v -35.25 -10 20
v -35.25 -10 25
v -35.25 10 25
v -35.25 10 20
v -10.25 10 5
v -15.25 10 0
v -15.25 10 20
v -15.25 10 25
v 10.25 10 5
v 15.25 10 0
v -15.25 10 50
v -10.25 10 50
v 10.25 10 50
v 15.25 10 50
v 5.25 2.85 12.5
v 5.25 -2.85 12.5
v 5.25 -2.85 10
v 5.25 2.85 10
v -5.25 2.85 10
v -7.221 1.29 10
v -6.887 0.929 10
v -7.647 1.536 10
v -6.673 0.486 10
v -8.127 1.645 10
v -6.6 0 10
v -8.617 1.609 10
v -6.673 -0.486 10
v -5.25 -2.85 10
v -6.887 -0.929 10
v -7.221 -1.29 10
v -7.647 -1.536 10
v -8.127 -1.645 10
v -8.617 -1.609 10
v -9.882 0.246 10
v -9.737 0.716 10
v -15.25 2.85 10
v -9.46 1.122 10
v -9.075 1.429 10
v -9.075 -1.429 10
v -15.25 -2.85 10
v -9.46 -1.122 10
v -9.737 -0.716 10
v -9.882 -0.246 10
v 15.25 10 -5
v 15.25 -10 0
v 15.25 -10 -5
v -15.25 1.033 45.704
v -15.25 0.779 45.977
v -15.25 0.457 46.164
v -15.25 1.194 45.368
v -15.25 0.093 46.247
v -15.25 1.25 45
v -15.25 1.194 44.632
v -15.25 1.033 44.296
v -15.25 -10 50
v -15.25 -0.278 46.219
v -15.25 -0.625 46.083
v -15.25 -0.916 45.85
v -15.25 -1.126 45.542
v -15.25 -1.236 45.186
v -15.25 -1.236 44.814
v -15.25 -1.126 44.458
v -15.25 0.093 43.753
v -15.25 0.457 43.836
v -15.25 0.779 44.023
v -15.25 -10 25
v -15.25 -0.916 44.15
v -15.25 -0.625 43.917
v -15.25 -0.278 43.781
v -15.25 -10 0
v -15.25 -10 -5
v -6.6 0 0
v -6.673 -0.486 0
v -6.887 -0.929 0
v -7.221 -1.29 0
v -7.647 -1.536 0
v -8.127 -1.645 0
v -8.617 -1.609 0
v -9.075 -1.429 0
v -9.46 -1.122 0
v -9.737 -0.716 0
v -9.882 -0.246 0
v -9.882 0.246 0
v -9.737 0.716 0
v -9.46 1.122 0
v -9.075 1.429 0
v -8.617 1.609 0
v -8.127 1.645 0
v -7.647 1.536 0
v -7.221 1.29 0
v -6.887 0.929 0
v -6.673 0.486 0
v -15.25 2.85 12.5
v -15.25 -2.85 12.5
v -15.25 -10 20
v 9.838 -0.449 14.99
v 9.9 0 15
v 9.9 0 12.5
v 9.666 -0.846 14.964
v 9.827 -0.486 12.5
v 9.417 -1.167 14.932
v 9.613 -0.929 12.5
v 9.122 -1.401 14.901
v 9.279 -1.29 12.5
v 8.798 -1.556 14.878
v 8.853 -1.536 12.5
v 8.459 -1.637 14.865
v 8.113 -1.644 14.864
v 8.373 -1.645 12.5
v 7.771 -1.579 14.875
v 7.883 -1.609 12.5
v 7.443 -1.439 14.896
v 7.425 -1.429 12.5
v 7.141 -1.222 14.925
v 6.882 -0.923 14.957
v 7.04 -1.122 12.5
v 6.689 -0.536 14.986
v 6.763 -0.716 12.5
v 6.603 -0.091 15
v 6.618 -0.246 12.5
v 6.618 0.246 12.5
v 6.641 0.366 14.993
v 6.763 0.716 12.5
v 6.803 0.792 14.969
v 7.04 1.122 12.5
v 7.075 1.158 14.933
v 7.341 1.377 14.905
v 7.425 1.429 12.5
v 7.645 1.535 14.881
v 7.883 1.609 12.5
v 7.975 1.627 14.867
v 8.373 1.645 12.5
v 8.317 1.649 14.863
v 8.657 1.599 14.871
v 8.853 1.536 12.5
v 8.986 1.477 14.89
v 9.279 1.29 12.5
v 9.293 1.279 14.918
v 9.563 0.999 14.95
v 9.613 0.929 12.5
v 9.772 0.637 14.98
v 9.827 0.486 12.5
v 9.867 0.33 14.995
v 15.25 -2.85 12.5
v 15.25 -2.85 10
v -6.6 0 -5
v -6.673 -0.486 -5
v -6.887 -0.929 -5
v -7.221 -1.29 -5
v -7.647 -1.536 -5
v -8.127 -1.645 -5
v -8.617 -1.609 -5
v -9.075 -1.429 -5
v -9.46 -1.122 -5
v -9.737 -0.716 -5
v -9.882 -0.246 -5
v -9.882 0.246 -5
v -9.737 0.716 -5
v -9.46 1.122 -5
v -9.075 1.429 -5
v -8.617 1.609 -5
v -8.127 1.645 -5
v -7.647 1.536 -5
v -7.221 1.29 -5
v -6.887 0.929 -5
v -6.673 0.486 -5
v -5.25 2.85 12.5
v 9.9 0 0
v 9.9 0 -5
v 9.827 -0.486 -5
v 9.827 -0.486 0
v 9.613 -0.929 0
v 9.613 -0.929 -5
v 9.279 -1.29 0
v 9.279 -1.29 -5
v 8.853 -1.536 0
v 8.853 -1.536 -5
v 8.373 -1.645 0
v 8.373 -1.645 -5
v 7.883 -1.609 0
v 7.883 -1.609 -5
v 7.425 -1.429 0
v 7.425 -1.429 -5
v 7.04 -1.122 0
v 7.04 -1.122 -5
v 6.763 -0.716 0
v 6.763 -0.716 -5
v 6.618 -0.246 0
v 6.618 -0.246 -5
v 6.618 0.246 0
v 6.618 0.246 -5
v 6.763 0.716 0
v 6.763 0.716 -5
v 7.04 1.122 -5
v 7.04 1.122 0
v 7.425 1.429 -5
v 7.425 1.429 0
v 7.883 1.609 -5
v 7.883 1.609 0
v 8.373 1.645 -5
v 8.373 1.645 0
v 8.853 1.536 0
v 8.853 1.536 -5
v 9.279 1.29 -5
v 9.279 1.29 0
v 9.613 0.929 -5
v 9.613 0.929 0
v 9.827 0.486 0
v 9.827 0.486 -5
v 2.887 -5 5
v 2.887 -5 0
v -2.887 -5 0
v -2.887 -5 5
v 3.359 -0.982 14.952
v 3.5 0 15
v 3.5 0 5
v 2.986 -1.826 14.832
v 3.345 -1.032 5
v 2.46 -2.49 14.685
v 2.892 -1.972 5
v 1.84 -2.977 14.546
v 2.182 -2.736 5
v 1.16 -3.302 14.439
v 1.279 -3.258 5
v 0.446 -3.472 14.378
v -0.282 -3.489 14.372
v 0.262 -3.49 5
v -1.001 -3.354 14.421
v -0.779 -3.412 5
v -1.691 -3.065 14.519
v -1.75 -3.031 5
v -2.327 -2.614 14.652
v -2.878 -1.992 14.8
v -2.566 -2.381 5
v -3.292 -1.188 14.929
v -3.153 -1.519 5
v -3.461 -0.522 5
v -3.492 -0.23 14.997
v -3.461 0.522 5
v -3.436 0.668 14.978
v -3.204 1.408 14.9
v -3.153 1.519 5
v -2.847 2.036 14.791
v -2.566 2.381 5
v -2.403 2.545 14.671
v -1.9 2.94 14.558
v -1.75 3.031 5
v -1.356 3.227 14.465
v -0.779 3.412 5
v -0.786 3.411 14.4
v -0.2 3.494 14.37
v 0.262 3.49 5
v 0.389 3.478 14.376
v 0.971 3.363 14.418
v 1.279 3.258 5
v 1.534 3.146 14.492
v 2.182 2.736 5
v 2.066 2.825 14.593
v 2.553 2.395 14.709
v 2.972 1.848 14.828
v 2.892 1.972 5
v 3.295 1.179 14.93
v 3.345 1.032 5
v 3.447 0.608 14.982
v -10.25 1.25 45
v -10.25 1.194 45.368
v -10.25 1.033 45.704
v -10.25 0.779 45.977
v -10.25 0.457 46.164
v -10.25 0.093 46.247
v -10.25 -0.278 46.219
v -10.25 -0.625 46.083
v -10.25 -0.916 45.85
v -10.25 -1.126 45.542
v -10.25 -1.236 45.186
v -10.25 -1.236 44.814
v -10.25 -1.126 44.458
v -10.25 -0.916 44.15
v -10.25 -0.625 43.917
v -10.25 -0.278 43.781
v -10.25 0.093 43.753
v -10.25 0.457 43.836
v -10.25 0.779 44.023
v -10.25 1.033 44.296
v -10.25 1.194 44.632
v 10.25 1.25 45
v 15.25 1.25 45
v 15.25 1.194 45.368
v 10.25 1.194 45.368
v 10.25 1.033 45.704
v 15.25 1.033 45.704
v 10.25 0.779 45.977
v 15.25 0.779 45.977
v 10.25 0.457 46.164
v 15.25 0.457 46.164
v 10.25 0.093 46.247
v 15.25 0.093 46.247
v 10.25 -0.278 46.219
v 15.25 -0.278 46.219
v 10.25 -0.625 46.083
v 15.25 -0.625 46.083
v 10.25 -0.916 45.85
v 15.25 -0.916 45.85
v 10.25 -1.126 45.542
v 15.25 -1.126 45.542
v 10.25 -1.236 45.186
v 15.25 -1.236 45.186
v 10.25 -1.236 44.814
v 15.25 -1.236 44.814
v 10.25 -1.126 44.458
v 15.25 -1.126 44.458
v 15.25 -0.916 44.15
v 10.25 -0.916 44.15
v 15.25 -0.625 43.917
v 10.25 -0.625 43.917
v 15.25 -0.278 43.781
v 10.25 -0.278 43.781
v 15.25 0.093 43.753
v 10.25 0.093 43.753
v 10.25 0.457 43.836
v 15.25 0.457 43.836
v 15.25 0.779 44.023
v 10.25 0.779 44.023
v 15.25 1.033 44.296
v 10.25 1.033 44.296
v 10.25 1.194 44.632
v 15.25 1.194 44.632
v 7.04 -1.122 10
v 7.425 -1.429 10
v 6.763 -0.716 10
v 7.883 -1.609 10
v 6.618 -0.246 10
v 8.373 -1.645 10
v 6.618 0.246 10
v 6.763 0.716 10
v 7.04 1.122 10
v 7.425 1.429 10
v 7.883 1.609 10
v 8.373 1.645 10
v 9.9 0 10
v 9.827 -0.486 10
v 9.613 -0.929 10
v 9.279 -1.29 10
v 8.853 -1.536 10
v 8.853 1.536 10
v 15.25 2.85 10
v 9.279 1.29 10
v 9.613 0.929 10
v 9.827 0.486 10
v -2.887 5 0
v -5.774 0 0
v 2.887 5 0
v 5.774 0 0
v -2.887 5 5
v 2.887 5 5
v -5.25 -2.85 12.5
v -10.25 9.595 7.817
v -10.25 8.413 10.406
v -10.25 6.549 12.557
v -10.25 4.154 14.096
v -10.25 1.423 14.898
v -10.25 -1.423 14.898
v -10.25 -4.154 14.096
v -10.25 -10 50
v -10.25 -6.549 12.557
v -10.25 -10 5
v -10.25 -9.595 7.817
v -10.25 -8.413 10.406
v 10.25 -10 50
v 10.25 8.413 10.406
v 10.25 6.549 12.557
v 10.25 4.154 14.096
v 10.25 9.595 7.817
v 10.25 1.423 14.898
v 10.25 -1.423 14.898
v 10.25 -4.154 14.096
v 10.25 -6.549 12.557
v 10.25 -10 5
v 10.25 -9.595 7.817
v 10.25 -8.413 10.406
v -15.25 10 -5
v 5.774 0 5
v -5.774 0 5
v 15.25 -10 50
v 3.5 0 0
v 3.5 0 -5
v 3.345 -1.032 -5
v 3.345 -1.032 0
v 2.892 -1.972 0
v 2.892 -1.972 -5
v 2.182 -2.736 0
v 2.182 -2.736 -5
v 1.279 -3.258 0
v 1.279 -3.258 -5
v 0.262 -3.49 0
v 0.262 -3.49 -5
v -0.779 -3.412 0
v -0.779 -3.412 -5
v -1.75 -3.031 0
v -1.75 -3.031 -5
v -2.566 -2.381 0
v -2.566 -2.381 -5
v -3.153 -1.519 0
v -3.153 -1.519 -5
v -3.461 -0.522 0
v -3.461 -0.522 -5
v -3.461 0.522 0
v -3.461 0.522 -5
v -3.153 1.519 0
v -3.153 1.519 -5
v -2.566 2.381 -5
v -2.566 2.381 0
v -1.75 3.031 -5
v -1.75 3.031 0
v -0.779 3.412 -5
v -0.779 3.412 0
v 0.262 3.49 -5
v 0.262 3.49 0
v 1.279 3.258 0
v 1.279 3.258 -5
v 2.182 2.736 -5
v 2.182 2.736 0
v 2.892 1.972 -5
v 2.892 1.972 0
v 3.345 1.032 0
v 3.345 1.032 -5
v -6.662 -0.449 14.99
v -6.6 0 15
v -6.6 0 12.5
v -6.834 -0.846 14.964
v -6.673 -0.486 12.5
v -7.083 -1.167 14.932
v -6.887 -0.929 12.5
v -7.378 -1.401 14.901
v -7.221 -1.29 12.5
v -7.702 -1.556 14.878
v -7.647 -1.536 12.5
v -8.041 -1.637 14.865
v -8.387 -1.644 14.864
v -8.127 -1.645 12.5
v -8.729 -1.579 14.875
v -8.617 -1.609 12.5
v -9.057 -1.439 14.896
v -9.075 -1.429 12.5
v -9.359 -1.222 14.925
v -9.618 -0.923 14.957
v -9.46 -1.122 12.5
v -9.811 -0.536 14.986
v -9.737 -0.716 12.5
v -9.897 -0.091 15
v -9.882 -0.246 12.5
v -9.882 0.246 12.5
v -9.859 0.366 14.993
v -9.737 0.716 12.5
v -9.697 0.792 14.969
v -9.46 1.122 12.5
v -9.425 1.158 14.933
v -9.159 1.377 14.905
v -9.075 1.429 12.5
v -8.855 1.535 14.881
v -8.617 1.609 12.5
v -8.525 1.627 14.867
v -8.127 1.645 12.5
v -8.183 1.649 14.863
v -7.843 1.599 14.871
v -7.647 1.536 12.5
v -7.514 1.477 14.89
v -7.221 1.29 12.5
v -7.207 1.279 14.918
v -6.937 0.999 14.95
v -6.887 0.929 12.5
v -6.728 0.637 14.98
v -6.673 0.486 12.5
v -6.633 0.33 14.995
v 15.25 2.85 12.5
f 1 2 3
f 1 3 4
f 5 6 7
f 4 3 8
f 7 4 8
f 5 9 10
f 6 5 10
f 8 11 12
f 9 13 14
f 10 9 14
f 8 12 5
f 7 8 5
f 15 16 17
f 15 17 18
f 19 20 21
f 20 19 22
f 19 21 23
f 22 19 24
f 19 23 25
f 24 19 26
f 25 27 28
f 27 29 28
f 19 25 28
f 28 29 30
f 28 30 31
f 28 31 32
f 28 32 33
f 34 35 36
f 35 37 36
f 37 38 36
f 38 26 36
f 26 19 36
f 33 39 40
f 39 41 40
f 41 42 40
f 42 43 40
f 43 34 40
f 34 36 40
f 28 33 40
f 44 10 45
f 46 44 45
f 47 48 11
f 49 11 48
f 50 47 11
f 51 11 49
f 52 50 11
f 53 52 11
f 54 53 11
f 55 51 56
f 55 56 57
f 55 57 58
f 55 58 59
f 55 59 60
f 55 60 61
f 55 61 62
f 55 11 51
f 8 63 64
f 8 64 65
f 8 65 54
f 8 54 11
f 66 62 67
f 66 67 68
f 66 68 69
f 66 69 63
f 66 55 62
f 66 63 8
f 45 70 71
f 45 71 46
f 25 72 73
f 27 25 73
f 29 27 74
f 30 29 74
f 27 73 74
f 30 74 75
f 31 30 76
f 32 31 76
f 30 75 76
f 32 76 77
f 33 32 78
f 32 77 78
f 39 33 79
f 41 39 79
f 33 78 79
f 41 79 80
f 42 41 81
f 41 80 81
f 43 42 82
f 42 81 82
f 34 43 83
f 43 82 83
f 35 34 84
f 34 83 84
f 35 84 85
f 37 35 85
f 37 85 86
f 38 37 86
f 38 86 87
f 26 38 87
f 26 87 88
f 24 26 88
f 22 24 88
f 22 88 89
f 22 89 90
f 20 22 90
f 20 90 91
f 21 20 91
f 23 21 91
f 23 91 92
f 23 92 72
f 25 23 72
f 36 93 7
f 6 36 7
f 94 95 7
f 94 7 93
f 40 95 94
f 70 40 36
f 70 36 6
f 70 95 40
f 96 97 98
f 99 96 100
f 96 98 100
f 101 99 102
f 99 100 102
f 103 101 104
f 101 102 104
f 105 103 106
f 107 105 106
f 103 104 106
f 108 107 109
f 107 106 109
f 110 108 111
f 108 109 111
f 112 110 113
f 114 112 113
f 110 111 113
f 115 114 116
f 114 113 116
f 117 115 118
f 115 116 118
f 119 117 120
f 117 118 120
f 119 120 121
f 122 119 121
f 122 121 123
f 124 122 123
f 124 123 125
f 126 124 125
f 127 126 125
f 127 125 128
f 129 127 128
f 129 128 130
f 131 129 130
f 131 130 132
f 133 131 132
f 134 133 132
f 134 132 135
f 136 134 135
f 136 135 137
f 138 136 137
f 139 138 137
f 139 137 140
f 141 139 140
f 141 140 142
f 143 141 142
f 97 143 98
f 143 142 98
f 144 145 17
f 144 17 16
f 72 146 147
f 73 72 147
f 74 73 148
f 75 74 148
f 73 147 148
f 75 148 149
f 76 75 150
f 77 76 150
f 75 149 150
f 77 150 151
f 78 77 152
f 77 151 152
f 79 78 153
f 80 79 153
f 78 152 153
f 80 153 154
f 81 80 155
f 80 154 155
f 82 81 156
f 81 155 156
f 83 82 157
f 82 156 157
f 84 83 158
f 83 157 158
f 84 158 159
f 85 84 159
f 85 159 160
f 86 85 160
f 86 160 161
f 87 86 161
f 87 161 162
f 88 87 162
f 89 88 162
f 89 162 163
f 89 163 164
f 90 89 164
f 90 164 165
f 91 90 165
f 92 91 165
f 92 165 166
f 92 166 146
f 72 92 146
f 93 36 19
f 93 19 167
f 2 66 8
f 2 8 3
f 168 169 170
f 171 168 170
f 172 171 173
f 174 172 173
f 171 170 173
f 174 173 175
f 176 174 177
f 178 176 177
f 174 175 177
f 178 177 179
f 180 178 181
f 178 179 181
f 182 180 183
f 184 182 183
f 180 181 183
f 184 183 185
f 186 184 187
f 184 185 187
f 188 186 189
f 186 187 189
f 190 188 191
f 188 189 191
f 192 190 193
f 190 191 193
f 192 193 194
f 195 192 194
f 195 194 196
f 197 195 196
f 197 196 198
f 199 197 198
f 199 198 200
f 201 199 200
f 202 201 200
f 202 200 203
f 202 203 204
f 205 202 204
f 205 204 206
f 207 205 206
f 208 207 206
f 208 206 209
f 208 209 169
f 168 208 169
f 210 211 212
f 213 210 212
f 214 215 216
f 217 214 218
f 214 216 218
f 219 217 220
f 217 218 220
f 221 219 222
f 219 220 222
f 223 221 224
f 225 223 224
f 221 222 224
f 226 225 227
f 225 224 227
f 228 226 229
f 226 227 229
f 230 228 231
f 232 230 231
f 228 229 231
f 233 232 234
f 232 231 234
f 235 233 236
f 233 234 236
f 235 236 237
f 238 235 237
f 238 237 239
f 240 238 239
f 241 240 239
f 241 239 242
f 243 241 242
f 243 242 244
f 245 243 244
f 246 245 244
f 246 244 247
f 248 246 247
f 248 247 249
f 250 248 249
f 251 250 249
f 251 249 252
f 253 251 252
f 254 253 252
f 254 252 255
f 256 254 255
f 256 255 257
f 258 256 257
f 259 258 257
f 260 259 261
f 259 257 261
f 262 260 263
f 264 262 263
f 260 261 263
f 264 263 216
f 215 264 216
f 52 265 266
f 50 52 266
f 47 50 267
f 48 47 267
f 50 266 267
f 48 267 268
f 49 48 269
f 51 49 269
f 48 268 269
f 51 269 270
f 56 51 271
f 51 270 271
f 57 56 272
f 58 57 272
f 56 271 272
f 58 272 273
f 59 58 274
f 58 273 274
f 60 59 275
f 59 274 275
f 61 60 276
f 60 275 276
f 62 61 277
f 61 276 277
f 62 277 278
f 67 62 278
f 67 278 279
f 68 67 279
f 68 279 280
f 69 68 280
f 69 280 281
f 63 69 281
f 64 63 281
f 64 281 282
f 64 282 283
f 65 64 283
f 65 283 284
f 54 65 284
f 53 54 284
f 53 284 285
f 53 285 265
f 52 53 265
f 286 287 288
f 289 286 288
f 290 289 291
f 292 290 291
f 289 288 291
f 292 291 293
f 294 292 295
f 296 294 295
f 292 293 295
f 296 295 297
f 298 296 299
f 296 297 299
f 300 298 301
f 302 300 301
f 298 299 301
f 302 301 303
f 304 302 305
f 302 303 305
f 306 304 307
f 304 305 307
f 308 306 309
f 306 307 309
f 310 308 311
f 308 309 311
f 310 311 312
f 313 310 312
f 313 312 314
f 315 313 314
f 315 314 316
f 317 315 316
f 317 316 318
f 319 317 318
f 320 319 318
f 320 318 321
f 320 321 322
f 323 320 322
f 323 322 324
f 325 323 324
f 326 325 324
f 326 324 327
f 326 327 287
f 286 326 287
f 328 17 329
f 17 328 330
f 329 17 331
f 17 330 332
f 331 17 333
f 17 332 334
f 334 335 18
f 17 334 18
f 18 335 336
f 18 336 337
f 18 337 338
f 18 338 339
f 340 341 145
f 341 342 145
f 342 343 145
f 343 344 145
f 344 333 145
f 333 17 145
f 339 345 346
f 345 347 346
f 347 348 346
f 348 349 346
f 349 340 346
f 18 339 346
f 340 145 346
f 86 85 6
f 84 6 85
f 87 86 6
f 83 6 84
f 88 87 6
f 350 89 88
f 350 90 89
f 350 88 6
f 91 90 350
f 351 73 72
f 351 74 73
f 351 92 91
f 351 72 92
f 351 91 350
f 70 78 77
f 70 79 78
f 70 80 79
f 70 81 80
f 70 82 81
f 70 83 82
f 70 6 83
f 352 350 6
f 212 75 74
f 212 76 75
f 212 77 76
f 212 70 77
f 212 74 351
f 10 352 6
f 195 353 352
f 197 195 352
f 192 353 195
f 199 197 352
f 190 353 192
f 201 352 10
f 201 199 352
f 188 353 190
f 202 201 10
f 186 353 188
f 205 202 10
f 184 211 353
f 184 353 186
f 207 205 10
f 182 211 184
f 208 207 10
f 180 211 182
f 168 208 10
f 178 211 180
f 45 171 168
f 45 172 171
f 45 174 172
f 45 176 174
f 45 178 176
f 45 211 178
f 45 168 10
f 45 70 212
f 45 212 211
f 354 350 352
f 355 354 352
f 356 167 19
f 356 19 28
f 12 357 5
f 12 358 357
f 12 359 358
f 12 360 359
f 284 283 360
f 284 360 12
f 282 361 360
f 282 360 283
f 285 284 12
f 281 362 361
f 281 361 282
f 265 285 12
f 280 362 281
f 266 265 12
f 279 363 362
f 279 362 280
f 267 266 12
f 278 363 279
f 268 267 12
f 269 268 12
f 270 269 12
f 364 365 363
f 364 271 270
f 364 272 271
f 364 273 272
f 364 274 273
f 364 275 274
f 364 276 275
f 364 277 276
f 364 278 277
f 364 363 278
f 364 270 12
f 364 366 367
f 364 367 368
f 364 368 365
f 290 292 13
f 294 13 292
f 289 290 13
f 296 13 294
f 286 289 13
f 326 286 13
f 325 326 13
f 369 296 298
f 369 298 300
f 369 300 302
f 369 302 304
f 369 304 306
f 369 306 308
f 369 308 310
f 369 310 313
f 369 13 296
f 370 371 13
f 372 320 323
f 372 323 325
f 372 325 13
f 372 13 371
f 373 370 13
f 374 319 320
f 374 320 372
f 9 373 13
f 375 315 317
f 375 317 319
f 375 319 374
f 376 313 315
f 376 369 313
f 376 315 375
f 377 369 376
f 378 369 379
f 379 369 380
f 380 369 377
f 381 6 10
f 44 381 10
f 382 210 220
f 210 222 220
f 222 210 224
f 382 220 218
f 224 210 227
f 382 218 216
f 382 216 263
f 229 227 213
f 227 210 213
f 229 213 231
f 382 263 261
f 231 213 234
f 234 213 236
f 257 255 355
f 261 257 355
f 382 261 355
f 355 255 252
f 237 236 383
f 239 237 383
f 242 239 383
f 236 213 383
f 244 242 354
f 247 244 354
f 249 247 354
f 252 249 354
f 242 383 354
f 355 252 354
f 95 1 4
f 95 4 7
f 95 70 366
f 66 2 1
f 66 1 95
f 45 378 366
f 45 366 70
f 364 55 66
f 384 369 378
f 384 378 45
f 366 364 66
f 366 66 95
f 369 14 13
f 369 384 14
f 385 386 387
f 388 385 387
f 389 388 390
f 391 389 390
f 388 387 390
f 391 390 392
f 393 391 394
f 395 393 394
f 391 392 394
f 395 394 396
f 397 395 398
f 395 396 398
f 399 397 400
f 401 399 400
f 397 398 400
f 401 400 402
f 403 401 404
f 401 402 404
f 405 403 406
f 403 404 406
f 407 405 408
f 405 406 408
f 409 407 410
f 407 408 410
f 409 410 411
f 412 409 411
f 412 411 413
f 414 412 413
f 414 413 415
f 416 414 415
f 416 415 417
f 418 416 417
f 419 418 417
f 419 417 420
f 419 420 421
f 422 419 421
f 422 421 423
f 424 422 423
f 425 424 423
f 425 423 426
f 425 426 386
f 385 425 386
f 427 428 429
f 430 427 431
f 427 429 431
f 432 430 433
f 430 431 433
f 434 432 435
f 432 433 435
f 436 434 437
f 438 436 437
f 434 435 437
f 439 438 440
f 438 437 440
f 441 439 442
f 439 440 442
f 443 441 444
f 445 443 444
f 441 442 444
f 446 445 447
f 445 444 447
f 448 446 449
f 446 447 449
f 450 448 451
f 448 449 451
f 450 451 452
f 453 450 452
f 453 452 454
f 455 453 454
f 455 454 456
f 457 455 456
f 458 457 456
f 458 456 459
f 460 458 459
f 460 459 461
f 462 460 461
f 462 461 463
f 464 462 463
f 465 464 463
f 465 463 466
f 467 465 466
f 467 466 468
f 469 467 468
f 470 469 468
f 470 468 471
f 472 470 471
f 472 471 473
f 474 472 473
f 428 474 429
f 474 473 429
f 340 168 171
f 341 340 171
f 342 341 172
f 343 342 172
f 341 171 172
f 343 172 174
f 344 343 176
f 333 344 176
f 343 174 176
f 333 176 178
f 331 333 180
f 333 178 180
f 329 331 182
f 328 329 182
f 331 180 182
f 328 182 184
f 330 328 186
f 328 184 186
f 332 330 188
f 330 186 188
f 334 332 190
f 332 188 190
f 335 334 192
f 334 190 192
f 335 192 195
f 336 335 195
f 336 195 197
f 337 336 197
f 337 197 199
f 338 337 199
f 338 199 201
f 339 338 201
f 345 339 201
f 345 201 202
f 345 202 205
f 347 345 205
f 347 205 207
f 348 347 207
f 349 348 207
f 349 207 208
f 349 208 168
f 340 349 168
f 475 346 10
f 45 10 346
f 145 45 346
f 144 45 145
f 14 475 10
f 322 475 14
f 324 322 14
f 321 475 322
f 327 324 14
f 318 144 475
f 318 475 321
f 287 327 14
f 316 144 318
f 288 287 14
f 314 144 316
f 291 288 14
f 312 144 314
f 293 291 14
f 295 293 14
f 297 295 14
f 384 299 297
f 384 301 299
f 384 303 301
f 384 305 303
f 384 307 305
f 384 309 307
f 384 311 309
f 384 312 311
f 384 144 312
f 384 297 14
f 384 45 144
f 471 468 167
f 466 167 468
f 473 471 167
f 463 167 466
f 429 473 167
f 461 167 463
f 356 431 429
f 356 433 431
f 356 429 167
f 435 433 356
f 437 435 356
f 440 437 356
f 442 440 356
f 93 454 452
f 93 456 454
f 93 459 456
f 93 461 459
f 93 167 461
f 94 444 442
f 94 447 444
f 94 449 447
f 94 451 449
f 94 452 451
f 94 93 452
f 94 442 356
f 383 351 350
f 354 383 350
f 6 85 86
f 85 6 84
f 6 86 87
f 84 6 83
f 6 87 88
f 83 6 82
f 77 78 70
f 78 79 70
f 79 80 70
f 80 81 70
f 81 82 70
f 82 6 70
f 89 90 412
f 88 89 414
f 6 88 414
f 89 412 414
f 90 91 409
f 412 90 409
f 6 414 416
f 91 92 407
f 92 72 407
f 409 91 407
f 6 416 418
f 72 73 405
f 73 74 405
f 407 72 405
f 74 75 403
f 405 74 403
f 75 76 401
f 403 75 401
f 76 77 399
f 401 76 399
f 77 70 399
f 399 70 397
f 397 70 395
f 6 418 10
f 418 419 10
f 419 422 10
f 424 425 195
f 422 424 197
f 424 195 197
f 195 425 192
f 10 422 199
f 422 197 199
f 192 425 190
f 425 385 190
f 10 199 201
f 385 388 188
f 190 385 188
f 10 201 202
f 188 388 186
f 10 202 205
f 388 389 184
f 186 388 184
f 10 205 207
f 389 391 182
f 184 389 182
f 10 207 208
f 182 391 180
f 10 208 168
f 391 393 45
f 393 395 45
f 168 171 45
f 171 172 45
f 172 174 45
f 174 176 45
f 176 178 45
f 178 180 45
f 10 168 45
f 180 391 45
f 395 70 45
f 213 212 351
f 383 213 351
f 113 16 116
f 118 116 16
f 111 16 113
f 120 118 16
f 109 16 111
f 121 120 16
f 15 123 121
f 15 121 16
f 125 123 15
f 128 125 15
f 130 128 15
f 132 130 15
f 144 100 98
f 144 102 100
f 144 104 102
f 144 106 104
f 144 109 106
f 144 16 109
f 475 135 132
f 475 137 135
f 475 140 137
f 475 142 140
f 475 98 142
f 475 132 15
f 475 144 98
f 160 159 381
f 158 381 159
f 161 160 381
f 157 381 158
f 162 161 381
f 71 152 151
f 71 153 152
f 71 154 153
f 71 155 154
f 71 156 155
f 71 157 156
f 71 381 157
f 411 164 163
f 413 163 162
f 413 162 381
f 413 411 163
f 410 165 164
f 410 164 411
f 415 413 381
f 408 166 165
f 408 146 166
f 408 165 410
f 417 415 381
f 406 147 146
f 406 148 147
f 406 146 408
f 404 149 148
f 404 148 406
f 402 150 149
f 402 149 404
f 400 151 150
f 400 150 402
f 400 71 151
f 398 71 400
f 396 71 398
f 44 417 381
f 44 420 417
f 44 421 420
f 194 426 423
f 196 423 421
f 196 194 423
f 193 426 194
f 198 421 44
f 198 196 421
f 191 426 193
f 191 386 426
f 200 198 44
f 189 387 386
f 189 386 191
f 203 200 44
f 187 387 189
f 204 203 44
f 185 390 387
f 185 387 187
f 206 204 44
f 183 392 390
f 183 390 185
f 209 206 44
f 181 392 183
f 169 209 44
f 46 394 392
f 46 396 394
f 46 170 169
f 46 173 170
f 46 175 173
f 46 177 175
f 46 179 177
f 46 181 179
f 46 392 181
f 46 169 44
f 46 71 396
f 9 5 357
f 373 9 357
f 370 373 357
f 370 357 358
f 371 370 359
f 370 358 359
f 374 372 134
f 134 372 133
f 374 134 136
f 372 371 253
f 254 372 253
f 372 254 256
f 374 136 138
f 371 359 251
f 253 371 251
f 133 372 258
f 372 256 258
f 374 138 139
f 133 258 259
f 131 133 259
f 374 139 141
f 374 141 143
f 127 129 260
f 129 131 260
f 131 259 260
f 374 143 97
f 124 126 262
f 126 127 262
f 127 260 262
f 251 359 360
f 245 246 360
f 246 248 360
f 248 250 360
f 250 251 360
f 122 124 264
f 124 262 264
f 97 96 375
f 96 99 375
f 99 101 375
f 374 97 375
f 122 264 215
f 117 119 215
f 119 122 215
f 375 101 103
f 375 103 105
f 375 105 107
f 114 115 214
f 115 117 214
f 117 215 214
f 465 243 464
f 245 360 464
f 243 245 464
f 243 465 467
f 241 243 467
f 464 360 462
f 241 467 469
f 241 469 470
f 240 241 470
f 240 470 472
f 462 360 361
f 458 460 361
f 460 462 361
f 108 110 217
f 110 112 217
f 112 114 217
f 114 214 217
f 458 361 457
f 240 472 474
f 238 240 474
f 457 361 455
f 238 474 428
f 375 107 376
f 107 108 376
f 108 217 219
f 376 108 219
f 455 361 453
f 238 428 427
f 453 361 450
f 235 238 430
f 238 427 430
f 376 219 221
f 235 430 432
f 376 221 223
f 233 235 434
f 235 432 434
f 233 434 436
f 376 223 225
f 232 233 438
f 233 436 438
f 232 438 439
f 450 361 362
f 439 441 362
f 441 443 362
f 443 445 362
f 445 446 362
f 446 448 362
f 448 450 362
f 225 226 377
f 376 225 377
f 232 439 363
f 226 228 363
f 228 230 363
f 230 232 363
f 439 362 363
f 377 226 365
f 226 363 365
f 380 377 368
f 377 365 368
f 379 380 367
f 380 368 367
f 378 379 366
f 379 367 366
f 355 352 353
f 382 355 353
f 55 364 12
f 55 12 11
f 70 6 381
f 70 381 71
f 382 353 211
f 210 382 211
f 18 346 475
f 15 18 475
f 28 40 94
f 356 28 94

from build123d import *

# Parameters (mm, degrees)
F1_DEPTH  = 10
F3_W      = 30.5
F3_H      = 20
F4_DEPTH  = 5
F5_DEPTH  = 5
F10_DEPTH = 20.5
F6_R      = 3.5
F6_R_2    = 1.65
F11_DEPTH = 55.001
F12_R     = 1.25
F13_DEPTH = 50.501
F7_W      = 5.7
F7_H      = 2.5
F14_DEPTH = 10
F8_W      = 5.7
F8_H      = 2.5
F15_DEPTH = 10


with BuildPart() as f1:
    # F0 (on Front) → F1 (new body, symmetric)
    with BuildSketch(Plane.XZ):
        Polygon((10.25, 5), (0, 5), (-10.25, 5), (-10.25, 50), (-15.25, 50), (-15.25, 25), (-35.25, 25), (-35.25, 20), (-15.25, 20), (-15.25, 0), (0, 0), (15.25, 0), (15.25, 50), (10.25, 50), align=None)
    extrude(amount=F1_DEPTH, both=True)

    # F2 (on face) → F5 (cut)
    with BuildSketch(Plane(origin=(0, 0, 0), x_dir=(1, 0, 0), z_dir=(0, 0, -1))):
        Polygon((2.8867513459, 5), (-2.8867513459, 5), (-5.7735026919, 0), (-2.8867513459, -5), (2.8867513459, -5), (5.7735026919, 0), align=None)
    extrude(amount=-F5_DEPTH, mode=Mode.SUBTRACT)

    # F9 (on face) → F10 (join, through all)
    with BuildSketch(Plane.YZ.offset(-10.25)):
        with BuildLine():
            Line((-10, 5), (10, 5))
            ThreePointArc((10, 5), (0, 15), (-10, 5))
        make_face()
    extrude(amount=F10_DEPTH)


with BuildPart() as f4:
    # F3 (on face) → F4 (new body)
    with BuildSketch(Plane(origin=(0, 0, 0), x_dir=(1, 0, 0), z_dir=(0, 0, -1))):
        Rectangle(F3_W, F3_H)
    extrude(amount=F4_DEPTH)


with BuildPart() as f11_tool:
    # F6 (on face) → F11 (new body, through all)
    with BuildSketch(Plane(origin=(0, 0, -5), x_dir=(1, 0, 0), z_dir=(0, 0, -1))):
        Circle(F6_R)
        with Locations((-8.25, 0)):
            Circle(F6_R_2)
        with Locations((8.25, 0)):
            Circle(F6_R_2)
    extrude(amount=-F11_DEPTH)


with BuildPart() as f1_1:
    add(f1.part)

    # F11: cut by f11_tool
    add(f11_tool.part, mode=Mode.SUBTRACT)

    # F12 (on face) → F13 (cut, through all)
    with BuildSketch(Plane.YZ.offset(15.25)):
        with Locations((0, 45)):
            Circle(F12_R)
    extrude(amount=-F13_DEPTH, mode=Mode.SUBTRACT)

    # F7 (on face) → F14 (cut)
    with BuildSketch(Plane(origin=(-15.25, 0, 0), x_dir=(0, -1, 0), z_dir=(-1, 0, 0))):
        with Locations((0, 11.25)):
            Rectangle(F7_W, F7_H)
    extrude(amount=-F14_DEPTH, mode=Mode.SUBTRACT)

    # F8 (on face) → F15 (cut)
    with BuildSketch(Plane.YZ.offset(15.25)):
        with Locations((0, 11.25)):
            Rectangle(F8_W, F8_H)
    extrude(amount=-F15_DEPTH, mode=Mode.SUBTRACT)


with BuildPart() as f4_1:
    add(f4.part)

    # F11: cut by f11_tool
    add(f11_tool.part, mode=Mode.SUBTRACT)


solid = Compound([f1_1.part, f4_1.part])
